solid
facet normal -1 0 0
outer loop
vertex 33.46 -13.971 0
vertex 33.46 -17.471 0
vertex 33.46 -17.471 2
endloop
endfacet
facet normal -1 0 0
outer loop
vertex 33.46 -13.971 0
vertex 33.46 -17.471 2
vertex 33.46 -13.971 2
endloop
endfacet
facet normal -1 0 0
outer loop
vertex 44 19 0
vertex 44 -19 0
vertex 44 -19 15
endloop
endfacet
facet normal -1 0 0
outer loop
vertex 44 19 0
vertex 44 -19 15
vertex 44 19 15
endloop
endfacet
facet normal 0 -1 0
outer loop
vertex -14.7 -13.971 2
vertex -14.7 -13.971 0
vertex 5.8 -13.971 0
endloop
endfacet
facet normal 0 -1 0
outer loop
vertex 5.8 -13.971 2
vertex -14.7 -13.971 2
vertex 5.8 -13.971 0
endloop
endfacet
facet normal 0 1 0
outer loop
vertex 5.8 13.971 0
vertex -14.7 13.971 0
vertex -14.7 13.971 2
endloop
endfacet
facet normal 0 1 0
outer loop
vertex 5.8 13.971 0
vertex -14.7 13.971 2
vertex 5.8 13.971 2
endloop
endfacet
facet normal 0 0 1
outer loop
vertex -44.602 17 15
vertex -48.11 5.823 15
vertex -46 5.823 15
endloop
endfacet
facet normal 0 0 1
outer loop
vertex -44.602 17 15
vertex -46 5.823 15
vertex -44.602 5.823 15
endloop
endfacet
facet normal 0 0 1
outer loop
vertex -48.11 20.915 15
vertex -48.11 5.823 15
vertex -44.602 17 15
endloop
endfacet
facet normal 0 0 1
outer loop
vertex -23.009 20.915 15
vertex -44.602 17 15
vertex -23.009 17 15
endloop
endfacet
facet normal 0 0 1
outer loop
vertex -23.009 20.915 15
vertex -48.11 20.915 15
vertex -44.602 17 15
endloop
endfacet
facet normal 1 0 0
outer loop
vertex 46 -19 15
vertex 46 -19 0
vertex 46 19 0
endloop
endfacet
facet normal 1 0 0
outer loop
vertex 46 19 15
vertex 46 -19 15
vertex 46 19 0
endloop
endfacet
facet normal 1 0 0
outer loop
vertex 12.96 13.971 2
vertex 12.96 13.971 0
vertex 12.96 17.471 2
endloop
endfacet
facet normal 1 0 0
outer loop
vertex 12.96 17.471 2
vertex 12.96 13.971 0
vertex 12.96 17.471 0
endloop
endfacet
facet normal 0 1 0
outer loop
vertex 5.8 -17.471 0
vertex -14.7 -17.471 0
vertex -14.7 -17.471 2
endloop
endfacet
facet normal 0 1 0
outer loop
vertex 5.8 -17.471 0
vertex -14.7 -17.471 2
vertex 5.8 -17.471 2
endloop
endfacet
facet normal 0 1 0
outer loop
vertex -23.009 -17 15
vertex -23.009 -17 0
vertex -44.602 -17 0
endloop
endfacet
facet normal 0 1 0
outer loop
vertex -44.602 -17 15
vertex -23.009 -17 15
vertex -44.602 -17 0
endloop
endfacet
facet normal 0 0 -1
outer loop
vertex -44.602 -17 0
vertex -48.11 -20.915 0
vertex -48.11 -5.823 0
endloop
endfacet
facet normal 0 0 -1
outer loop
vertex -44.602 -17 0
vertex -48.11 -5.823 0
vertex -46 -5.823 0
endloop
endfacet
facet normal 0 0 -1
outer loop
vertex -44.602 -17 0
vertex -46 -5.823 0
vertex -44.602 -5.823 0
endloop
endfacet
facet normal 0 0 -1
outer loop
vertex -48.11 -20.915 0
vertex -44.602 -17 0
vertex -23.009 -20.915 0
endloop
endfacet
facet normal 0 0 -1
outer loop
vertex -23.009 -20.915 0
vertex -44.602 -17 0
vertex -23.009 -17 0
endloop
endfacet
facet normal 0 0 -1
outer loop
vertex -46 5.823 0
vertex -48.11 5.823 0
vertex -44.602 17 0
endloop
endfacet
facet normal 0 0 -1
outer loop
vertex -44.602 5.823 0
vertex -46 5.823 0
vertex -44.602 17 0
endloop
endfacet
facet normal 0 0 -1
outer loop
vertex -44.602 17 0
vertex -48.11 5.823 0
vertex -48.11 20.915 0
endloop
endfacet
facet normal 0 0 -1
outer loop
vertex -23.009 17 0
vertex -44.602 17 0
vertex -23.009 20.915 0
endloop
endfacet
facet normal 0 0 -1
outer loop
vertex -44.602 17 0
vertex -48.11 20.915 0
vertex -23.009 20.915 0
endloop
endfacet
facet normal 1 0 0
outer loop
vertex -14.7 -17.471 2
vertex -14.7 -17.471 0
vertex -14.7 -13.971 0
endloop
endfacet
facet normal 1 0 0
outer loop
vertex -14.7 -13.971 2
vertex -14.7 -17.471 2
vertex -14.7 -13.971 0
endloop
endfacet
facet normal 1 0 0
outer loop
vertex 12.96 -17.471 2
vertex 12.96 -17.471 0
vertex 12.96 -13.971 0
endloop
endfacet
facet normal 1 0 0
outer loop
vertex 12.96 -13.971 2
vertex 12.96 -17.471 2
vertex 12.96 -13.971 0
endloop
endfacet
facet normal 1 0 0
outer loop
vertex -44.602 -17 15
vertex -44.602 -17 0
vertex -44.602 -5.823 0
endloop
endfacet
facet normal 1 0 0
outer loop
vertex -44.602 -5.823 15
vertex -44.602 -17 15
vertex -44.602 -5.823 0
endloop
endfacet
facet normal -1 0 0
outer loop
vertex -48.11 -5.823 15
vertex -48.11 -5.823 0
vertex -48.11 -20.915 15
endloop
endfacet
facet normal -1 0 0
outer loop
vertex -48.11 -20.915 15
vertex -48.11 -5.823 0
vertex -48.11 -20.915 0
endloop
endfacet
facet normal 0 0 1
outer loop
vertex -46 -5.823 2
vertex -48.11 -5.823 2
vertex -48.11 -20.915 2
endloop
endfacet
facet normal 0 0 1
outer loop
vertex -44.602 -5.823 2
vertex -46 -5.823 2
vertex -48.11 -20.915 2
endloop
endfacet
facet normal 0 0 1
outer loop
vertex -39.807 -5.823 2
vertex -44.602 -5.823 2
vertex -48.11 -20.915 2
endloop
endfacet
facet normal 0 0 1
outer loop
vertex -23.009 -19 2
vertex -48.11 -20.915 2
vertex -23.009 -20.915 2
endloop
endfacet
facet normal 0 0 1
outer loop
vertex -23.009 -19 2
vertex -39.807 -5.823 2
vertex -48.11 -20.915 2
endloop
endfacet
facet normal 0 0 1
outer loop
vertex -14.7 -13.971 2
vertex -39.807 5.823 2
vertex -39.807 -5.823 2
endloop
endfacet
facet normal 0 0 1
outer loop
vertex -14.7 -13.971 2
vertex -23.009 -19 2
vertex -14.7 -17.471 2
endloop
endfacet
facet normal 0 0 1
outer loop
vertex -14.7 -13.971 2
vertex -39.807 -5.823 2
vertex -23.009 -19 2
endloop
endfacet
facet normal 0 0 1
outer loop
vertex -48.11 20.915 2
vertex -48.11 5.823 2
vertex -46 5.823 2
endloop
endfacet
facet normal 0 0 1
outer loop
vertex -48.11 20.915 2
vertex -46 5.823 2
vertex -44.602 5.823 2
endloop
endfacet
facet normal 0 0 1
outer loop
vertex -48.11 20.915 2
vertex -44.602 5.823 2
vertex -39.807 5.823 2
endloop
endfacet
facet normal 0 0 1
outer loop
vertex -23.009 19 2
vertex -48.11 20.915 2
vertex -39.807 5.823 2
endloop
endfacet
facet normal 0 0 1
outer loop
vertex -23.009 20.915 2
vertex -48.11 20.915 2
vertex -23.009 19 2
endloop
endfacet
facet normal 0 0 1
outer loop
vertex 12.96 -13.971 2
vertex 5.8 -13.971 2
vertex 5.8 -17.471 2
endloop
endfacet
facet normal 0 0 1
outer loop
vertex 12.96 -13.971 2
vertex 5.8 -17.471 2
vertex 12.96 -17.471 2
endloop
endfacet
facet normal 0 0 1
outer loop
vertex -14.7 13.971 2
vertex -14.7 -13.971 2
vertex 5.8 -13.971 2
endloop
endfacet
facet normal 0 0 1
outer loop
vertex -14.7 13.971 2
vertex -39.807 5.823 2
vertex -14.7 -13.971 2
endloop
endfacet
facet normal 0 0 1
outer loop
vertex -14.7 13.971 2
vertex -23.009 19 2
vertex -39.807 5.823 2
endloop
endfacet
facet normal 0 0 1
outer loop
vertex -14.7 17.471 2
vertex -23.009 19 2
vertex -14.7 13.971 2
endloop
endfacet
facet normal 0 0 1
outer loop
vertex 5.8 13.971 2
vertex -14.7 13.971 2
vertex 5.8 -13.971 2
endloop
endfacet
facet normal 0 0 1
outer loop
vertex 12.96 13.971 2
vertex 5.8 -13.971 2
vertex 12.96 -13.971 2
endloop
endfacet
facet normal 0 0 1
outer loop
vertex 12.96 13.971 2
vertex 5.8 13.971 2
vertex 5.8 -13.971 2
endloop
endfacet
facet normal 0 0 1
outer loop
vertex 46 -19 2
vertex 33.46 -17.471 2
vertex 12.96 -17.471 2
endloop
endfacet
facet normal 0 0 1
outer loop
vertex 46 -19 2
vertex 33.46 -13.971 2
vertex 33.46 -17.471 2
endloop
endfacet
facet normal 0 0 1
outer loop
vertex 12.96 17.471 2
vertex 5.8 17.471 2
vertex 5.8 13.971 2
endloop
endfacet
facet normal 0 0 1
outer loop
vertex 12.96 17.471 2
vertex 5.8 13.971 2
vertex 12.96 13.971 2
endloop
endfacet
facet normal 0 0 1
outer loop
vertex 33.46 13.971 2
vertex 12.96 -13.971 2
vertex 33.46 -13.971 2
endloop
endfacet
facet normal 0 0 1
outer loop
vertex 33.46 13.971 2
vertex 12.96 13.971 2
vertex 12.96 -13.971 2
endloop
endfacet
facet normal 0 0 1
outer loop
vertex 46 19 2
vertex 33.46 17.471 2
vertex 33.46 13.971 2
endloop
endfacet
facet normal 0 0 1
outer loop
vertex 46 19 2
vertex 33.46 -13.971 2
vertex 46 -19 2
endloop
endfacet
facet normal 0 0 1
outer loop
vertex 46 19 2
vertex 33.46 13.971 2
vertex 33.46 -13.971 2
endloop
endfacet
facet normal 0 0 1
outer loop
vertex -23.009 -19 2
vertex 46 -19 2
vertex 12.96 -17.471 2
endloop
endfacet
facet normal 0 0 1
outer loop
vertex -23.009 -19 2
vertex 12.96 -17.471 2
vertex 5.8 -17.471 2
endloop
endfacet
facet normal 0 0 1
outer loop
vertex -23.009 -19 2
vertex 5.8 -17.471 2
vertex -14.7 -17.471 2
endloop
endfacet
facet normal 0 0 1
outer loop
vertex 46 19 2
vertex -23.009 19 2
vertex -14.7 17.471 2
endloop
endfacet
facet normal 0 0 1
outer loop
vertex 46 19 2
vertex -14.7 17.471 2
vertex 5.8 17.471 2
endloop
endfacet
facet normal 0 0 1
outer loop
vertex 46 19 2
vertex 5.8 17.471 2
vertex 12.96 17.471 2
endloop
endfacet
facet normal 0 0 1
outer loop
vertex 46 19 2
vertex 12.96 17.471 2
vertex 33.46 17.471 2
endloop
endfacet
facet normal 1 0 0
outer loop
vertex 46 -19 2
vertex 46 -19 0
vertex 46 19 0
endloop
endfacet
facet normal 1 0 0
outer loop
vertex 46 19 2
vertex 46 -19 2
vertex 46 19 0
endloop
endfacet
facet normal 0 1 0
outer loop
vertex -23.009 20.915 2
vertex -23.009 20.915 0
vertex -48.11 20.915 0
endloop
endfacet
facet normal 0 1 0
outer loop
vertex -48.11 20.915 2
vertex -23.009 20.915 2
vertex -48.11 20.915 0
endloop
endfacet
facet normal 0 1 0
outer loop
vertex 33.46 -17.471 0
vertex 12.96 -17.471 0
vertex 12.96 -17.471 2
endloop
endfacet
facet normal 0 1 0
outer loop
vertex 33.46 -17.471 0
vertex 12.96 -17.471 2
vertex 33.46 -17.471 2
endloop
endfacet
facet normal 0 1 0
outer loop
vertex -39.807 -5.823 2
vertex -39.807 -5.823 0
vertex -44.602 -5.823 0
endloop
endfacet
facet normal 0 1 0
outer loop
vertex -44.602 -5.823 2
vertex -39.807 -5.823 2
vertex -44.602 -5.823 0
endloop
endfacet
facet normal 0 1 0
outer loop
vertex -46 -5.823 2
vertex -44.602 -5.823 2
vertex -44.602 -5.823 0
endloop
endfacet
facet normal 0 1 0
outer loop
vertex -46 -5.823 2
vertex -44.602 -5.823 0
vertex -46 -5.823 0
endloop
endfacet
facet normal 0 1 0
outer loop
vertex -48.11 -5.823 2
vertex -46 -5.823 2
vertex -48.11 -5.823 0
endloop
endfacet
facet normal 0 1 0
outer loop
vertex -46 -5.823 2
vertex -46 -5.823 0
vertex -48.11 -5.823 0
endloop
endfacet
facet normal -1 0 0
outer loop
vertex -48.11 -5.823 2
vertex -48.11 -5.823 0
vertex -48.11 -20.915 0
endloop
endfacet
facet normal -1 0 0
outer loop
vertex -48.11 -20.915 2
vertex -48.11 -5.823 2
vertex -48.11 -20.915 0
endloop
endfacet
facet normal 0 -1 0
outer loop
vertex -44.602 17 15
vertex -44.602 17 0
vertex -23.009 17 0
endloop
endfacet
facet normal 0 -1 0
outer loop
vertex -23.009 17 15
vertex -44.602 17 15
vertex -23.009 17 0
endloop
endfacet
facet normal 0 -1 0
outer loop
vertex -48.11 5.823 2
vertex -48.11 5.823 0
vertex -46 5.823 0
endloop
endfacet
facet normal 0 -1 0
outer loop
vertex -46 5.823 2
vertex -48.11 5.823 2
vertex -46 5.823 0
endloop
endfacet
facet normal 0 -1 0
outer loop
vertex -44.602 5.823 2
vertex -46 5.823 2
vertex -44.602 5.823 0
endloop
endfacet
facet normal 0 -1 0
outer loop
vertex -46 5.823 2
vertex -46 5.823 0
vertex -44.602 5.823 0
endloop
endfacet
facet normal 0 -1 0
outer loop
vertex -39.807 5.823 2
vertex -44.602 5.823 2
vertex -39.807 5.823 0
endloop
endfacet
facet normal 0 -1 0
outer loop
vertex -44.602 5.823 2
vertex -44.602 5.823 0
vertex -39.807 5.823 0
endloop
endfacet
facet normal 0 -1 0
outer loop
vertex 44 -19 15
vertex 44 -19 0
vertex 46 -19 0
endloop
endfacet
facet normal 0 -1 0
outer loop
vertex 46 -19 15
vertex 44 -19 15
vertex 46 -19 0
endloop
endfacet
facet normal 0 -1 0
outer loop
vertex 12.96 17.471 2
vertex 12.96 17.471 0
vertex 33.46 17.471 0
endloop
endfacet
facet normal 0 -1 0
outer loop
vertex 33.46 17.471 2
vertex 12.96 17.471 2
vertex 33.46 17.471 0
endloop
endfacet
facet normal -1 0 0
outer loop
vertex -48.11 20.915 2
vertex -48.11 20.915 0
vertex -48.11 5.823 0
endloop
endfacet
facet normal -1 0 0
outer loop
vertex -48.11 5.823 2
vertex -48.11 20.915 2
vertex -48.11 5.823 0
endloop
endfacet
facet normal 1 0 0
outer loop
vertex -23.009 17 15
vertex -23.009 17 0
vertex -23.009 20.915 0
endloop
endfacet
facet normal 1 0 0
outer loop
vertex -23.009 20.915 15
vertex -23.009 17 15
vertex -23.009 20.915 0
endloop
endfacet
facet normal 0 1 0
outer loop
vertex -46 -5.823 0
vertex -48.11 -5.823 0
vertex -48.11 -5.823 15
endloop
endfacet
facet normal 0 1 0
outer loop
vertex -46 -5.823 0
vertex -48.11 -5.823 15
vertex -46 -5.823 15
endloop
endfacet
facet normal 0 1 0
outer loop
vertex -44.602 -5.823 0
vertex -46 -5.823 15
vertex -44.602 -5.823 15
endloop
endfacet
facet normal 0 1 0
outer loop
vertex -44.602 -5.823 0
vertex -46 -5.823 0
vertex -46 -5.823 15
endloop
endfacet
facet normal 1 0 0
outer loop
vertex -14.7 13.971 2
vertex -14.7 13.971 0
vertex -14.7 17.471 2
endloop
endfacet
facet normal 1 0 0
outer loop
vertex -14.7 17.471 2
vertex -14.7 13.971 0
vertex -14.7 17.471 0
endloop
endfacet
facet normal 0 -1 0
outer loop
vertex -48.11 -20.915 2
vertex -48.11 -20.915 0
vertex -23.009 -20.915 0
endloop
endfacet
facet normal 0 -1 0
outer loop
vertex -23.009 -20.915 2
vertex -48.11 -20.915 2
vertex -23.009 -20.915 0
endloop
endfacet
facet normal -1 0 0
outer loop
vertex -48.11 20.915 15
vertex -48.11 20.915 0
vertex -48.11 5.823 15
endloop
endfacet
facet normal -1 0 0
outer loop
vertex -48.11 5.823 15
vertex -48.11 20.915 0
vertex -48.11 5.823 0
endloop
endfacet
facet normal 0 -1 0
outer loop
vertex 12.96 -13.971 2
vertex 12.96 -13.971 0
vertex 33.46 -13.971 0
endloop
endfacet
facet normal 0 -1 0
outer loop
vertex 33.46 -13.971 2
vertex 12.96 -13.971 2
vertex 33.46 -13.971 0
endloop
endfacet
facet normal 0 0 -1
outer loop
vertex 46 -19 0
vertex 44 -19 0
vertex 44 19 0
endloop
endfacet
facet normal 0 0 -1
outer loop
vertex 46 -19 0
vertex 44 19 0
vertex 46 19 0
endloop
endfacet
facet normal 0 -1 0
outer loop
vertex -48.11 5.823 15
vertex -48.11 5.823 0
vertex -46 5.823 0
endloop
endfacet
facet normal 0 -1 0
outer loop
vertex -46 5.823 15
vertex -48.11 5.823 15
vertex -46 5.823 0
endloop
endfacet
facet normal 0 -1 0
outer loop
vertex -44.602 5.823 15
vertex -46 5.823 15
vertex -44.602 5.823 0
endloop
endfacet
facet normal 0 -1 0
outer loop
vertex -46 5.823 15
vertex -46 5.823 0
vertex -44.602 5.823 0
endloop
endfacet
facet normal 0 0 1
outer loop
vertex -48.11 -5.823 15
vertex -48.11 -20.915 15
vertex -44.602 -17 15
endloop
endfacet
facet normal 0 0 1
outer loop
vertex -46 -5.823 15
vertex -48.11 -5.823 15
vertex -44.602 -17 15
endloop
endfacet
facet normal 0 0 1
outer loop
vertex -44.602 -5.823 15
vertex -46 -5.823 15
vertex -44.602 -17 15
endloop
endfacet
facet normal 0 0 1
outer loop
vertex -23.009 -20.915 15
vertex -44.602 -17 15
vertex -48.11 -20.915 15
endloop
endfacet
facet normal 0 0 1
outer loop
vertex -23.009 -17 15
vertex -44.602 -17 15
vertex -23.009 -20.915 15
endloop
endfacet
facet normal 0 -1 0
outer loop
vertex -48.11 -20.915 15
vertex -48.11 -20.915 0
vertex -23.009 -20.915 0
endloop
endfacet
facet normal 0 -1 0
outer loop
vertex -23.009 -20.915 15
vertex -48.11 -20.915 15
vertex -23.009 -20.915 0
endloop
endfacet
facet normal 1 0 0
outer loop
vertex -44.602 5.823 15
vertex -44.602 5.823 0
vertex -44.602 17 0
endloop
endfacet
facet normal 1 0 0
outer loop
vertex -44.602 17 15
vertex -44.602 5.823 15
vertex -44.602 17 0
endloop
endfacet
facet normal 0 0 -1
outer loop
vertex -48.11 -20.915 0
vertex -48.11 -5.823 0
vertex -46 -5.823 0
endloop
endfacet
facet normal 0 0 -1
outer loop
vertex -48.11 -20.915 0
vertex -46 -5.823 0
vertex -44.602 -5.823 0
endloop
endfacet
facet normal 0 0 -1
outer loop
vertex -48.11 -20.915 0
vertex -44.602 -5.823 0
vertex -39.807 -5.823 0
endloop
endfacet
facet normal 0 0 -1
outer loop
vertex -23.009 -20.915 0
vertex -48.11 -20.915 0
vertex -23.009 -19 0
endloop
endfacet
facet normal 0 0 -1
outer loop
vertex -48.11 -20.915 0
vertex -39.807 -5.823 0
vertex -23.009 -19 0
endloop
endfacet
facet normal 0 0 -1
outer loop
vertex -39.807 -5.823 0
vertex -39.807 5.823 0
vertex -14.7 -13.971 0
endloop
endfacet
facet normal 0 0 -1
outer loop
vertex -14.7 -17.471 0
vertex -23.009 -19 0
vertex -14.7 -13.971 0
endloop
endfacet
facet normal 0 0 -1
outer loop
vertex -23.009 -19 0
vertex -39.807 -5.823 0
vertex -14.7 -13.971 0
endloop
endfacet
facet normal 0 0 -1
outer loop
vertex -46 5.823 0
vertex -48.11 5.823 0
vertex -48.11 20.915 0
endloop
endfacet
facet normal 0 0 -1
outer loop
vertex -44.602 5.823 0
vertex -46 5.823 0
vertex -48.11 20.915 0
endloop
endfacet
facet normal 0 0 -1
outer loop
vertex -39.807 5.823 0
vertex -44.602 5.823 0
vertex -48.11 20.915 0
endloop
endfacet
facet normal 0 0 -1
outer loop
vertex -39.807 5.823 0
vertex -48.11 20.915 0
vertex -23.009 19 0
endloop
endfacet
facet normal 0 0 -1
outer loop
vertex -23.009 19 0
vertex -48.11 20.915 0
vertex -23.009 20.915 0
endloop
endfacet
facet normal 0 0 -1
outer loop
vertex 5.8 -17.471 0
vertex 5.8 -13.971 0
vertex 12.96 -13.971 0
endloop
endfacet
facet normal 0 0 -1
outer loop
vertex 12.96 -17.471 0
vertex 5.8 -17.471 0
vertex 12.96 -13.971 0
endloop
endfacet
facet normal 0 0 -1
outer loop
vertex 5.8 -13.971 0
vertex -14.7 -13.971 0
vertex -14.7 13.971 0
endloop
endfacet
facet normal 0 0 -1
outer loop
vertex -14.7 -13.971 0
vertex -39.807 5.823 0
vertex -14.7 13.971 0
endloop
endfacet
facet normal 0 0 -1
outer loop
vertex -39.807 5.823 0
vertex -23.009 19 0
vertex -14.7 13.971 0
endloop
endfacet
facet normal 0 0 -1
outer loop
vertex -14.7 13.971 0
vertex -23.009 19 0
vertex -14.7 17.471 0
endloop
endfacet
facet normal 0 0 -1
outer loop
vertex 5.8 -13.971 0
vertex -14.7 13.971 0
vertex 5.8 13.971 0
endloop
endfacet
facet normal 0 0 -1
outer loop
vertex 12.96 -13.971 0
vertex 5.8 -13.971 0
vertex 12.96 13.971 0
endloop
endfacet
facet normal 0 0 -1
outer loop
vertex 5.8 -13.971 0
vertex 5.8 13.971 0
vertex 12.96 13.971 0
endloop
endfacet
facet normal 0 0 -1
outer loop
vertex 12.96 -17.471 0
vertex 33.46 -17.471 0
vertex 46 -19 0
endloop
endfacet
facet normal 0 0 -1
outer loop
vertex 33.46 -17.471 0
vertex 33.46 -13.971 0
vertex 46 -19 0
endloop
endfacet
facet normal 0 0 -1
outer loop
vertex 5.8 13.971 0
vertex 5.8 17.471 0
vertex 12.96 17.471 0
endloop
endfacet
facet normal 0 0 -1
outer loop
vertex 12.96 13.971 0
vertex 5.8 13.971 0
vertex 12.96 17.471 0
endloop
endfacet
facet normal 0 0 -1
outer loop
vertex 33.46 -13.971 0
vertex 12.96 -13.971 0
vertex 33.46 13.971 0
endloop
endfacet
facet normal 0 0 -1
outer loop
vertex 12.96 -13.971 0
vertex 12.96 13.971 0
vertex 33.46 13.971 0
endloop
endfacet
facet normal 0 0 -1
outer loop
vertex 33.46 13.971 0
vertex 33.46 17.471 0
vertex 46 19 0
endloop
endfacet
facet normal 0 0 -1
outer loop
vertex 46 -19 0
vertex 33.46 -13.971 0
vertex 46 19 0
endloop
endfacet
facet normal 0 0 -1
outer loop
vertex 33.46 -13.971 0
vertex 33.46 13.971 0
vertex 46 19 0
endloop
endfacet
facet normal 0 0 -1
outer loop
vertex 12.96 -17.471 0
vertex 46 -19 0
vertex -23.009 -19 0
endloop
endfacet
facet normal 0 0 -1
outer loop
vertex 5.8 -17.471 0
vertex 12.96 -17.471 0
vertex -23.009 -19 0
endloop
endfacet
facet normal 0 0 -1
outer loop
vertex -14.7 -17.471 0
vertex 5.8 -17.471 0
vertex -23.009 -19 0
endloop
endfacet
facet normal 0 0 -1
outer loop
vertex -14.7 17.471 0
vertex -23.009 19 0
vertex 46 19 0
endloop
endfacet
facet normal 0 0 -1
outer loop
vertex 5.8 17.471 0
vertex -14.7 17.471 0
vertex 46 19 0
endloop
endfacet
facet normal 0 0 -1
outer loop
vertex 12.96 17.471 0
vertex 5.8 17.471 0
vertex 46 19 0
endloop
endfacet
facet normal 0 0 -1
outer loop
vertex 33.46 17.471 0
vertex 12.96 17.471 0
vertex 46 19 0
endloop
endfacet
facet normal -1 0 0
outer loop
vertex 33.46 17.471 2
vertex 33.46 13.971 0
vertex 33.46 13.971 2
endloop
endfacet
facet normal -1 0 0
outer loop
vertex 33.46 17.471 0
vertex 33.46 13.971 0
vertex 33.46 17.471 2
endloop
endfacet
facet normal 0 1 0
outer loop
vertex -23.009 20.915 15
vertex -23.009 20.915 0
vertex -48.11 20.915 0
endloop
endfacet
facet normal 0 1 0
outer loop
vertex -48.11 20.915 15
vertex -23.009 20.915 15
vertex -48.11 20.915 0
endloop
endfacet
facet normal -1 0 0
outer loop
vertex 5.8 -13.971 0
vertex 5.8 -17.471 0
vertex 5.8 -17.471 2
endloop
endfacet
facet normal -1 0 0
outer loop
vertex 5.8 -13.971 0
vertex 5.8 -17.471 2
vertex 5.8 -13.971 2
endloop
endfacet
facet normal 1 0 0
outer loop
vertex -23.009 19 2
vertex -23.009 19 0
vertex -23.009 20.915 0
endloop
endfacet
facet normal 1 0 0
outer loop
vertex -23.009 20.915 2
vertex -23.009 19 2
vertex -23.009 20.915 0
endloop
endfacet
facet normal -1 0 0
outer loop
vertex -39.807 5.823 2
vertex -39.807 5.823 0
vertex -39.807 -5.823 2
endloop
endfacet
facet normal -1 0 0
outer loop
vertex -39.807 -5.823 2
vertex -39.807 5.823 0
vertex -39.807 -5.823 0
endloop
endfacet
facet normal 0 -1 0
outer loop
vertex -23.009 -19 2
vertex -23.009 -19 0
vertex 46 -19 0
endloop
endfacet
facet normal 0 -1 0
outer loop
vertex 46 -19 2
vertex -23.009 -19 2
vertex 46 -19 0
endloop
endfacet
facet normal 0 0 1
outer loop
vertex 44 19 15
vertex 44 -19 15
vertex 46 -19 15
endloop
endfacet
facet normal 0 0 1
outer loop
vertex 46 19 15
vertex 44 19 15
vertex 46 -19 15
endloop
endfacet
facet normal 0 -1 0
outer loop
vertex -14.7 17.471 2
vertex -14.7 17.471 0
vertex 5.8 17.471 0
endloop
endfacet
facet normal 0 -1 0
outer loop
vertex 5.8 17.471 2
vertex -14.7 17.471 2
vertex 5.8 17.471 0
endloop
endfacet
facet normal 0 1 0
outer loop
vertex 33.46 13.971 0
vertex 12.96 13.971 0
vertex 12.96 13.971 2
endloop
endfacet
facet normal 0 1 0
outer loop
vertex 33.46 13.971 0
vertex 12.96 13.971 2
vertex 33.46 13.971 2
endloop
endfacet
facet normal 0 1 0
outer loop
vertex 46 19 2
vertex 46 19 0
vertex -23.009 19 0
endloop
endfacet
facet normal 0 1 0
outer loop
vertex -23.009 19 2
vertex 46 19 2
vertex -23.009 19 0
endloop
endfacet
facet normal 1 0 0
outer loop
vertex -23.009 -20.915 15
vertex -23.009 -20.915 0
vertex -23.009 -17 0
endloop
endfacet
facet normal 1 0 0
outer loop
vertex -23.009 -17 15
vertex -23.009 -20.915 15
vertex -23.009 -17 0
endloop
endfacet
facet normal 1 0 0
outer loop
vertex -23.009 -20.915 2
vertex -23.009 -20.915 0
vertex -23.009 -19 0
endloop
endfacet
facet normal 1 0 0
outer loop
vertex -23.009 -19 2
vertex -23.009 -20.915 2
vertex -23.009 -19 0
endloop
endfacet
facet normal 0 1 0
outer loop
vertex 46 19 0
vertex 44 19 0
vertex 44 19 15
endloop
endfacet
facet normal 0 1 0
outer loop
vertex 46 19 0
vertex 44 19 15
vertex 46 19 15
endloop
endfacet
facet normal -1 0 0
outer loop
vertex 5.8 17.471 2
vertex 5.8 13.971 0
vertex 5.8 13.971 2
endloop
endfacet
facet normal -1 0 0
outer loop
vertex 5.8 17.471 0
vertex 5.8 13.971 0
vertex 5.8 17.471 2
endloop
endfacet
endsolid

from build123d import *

# Parameters (mm, degrees)
F0_W     = 2
F0_H     = 38
F1_DEPTH = 15
F0_W_2   = 1.398183316
F0_H_2   = 11.1771705635
F0_W_3   = 20.5
F0_H_3   = 3.5
F2_DEPTH = 2


with BuildPart() as f1:
    # F0 (on Top) → F1 (new body)
    with BuildSketch(Plane.XY):
        with Locations((45, 0)):
            Rectangle(F0_W, F0_H)
    extrude(amount=F1_DEPTH)


with BuildPart() as f1b:
    # F0 (on Top) → F1, piece 2 (new body)
    with BuildSketch(Plane.XY):
        Polygon((-46, 17), (-46, 19), (-23.0085216463, 19), (-23.0085216463, 20.9154672921), (-46, 20.9154672921), (-48.1095127761, 20.9154672921), (-48.1095127761, 5.8228294365), (-46, 5.8228294365), align=None)
        Polygon((-23.0085216463, 19), (-46, 19), (-46, 17), (-44.601816684, 17), (-23.0085216463, 17), align=None)
        with Locations((-45.300908342, 11.4114147183)):
            Rectangle(F0_W_2, F0_H_2)
    extrude(amount=F1_DEPTH)


with BuildPart() as f1c:
    # F0 (on Top) → F1, piece 3 (new body)
    with BuildSketch(Plane.XY):
        Polygon((-23.0085216463, -20.9154672921), (-23.0085216463, -19), (-46, -19), (-46, -17), (-46, -5.8228294365), (-48.1095127761, -5.8228294365), (-48.1095127761, -20.9154672921), (-46, -20.9154672921), align=None)
        Polygon((-46, -19), (-23.0085216463, -19), (-23.0085216463, -17), (-44.601816684, -17), (-46, -17), align=None)
        with Locations((-45.300908342, -11.4114147183)):
            Rectangle(F0_W_2, F0_H_2)
    extrude(amount=F1_DEPTH)


with BuildPart() as f2:
    # F0 (on Top) → F2 (new body)
    with BuildSketch(Plane.XY):
        Polygon((-46, 17), (-46, 19), (-23.0085216463, 19), (-23.0085216463, 20.9154672921), (-46, 20.9154672921), (-48.1095127761, 20.9154672921), (-48.1095127761, 5.8228294365), (-46, 5.8228294365), align=None)
        Polygon((-23.0085216463, 19), (-46, 19), (-46, 17), (-44.601816684, 17), (-23.0085216463, 17), align=None)
        Polygon((44, 19), (-23.0085216463, 19), (-23.0085216463, 17), (-44.601816684, 17), (-44.601816684, 5.8228294365), (-39.8070141673, 5.8228294365), (-39.8070141673, -5.8228294365), (-44.601816684, -5.8228294365), (-44.601816684, -17), (-23.0085216463, -17), (-23.0085216463, -19), (44, -19), align=None)
        with Locations((-4.45, -15.7208904922)):
            Rectangle(F0_W_3, F0_H_3, mode=Mode.SUBTRACT)
        with Locations((23.21, -15.7208904922)):
            Rectangle(F0_W_3, F0_H_3, mode=Mode.SUBTRACT)
        with Locations((-4.45, 15.7208904922)):
            Rectangle(F0_W_3, F0_H_3, mode=Mode.SUBTRACT)
        with Locations((23.21, 15.7208904922)):
            Rectangle(F0_W_3, F0_H_3, mode=Mode.SUBTRACT)
        with Locations((-45.300908342, 11.4114147183)):
            Rectangle(F0_W_2, F0_H_2)
        with Locations((45, 0)):
            Rectangle(F0_W, F0_H)
        Polygon((-23.0085216463, -20.9154672921), (-23.0085216463, -19), (-46, -19), (-46, -17), (-46, -5.8228294365), (-48.1095127761, -5.8228294365), (-48.1095127761, -20.9154672921), (-46, -20.9154672921), align=None)
        Polygon((-46, -19), (-23.0085216463, -19), (-23.0085216463, -17), (-44.601816684, -17), (-46, -17), align=None)
        with Locations((-45.300908342, -11.4114147183)):
            Rectangle(F0_W_2, F0_H_2)
    extrude(amount=F2_DEPTH)


solid = Compound([f1.part, f1b.part, f1c.part, f2.part])
